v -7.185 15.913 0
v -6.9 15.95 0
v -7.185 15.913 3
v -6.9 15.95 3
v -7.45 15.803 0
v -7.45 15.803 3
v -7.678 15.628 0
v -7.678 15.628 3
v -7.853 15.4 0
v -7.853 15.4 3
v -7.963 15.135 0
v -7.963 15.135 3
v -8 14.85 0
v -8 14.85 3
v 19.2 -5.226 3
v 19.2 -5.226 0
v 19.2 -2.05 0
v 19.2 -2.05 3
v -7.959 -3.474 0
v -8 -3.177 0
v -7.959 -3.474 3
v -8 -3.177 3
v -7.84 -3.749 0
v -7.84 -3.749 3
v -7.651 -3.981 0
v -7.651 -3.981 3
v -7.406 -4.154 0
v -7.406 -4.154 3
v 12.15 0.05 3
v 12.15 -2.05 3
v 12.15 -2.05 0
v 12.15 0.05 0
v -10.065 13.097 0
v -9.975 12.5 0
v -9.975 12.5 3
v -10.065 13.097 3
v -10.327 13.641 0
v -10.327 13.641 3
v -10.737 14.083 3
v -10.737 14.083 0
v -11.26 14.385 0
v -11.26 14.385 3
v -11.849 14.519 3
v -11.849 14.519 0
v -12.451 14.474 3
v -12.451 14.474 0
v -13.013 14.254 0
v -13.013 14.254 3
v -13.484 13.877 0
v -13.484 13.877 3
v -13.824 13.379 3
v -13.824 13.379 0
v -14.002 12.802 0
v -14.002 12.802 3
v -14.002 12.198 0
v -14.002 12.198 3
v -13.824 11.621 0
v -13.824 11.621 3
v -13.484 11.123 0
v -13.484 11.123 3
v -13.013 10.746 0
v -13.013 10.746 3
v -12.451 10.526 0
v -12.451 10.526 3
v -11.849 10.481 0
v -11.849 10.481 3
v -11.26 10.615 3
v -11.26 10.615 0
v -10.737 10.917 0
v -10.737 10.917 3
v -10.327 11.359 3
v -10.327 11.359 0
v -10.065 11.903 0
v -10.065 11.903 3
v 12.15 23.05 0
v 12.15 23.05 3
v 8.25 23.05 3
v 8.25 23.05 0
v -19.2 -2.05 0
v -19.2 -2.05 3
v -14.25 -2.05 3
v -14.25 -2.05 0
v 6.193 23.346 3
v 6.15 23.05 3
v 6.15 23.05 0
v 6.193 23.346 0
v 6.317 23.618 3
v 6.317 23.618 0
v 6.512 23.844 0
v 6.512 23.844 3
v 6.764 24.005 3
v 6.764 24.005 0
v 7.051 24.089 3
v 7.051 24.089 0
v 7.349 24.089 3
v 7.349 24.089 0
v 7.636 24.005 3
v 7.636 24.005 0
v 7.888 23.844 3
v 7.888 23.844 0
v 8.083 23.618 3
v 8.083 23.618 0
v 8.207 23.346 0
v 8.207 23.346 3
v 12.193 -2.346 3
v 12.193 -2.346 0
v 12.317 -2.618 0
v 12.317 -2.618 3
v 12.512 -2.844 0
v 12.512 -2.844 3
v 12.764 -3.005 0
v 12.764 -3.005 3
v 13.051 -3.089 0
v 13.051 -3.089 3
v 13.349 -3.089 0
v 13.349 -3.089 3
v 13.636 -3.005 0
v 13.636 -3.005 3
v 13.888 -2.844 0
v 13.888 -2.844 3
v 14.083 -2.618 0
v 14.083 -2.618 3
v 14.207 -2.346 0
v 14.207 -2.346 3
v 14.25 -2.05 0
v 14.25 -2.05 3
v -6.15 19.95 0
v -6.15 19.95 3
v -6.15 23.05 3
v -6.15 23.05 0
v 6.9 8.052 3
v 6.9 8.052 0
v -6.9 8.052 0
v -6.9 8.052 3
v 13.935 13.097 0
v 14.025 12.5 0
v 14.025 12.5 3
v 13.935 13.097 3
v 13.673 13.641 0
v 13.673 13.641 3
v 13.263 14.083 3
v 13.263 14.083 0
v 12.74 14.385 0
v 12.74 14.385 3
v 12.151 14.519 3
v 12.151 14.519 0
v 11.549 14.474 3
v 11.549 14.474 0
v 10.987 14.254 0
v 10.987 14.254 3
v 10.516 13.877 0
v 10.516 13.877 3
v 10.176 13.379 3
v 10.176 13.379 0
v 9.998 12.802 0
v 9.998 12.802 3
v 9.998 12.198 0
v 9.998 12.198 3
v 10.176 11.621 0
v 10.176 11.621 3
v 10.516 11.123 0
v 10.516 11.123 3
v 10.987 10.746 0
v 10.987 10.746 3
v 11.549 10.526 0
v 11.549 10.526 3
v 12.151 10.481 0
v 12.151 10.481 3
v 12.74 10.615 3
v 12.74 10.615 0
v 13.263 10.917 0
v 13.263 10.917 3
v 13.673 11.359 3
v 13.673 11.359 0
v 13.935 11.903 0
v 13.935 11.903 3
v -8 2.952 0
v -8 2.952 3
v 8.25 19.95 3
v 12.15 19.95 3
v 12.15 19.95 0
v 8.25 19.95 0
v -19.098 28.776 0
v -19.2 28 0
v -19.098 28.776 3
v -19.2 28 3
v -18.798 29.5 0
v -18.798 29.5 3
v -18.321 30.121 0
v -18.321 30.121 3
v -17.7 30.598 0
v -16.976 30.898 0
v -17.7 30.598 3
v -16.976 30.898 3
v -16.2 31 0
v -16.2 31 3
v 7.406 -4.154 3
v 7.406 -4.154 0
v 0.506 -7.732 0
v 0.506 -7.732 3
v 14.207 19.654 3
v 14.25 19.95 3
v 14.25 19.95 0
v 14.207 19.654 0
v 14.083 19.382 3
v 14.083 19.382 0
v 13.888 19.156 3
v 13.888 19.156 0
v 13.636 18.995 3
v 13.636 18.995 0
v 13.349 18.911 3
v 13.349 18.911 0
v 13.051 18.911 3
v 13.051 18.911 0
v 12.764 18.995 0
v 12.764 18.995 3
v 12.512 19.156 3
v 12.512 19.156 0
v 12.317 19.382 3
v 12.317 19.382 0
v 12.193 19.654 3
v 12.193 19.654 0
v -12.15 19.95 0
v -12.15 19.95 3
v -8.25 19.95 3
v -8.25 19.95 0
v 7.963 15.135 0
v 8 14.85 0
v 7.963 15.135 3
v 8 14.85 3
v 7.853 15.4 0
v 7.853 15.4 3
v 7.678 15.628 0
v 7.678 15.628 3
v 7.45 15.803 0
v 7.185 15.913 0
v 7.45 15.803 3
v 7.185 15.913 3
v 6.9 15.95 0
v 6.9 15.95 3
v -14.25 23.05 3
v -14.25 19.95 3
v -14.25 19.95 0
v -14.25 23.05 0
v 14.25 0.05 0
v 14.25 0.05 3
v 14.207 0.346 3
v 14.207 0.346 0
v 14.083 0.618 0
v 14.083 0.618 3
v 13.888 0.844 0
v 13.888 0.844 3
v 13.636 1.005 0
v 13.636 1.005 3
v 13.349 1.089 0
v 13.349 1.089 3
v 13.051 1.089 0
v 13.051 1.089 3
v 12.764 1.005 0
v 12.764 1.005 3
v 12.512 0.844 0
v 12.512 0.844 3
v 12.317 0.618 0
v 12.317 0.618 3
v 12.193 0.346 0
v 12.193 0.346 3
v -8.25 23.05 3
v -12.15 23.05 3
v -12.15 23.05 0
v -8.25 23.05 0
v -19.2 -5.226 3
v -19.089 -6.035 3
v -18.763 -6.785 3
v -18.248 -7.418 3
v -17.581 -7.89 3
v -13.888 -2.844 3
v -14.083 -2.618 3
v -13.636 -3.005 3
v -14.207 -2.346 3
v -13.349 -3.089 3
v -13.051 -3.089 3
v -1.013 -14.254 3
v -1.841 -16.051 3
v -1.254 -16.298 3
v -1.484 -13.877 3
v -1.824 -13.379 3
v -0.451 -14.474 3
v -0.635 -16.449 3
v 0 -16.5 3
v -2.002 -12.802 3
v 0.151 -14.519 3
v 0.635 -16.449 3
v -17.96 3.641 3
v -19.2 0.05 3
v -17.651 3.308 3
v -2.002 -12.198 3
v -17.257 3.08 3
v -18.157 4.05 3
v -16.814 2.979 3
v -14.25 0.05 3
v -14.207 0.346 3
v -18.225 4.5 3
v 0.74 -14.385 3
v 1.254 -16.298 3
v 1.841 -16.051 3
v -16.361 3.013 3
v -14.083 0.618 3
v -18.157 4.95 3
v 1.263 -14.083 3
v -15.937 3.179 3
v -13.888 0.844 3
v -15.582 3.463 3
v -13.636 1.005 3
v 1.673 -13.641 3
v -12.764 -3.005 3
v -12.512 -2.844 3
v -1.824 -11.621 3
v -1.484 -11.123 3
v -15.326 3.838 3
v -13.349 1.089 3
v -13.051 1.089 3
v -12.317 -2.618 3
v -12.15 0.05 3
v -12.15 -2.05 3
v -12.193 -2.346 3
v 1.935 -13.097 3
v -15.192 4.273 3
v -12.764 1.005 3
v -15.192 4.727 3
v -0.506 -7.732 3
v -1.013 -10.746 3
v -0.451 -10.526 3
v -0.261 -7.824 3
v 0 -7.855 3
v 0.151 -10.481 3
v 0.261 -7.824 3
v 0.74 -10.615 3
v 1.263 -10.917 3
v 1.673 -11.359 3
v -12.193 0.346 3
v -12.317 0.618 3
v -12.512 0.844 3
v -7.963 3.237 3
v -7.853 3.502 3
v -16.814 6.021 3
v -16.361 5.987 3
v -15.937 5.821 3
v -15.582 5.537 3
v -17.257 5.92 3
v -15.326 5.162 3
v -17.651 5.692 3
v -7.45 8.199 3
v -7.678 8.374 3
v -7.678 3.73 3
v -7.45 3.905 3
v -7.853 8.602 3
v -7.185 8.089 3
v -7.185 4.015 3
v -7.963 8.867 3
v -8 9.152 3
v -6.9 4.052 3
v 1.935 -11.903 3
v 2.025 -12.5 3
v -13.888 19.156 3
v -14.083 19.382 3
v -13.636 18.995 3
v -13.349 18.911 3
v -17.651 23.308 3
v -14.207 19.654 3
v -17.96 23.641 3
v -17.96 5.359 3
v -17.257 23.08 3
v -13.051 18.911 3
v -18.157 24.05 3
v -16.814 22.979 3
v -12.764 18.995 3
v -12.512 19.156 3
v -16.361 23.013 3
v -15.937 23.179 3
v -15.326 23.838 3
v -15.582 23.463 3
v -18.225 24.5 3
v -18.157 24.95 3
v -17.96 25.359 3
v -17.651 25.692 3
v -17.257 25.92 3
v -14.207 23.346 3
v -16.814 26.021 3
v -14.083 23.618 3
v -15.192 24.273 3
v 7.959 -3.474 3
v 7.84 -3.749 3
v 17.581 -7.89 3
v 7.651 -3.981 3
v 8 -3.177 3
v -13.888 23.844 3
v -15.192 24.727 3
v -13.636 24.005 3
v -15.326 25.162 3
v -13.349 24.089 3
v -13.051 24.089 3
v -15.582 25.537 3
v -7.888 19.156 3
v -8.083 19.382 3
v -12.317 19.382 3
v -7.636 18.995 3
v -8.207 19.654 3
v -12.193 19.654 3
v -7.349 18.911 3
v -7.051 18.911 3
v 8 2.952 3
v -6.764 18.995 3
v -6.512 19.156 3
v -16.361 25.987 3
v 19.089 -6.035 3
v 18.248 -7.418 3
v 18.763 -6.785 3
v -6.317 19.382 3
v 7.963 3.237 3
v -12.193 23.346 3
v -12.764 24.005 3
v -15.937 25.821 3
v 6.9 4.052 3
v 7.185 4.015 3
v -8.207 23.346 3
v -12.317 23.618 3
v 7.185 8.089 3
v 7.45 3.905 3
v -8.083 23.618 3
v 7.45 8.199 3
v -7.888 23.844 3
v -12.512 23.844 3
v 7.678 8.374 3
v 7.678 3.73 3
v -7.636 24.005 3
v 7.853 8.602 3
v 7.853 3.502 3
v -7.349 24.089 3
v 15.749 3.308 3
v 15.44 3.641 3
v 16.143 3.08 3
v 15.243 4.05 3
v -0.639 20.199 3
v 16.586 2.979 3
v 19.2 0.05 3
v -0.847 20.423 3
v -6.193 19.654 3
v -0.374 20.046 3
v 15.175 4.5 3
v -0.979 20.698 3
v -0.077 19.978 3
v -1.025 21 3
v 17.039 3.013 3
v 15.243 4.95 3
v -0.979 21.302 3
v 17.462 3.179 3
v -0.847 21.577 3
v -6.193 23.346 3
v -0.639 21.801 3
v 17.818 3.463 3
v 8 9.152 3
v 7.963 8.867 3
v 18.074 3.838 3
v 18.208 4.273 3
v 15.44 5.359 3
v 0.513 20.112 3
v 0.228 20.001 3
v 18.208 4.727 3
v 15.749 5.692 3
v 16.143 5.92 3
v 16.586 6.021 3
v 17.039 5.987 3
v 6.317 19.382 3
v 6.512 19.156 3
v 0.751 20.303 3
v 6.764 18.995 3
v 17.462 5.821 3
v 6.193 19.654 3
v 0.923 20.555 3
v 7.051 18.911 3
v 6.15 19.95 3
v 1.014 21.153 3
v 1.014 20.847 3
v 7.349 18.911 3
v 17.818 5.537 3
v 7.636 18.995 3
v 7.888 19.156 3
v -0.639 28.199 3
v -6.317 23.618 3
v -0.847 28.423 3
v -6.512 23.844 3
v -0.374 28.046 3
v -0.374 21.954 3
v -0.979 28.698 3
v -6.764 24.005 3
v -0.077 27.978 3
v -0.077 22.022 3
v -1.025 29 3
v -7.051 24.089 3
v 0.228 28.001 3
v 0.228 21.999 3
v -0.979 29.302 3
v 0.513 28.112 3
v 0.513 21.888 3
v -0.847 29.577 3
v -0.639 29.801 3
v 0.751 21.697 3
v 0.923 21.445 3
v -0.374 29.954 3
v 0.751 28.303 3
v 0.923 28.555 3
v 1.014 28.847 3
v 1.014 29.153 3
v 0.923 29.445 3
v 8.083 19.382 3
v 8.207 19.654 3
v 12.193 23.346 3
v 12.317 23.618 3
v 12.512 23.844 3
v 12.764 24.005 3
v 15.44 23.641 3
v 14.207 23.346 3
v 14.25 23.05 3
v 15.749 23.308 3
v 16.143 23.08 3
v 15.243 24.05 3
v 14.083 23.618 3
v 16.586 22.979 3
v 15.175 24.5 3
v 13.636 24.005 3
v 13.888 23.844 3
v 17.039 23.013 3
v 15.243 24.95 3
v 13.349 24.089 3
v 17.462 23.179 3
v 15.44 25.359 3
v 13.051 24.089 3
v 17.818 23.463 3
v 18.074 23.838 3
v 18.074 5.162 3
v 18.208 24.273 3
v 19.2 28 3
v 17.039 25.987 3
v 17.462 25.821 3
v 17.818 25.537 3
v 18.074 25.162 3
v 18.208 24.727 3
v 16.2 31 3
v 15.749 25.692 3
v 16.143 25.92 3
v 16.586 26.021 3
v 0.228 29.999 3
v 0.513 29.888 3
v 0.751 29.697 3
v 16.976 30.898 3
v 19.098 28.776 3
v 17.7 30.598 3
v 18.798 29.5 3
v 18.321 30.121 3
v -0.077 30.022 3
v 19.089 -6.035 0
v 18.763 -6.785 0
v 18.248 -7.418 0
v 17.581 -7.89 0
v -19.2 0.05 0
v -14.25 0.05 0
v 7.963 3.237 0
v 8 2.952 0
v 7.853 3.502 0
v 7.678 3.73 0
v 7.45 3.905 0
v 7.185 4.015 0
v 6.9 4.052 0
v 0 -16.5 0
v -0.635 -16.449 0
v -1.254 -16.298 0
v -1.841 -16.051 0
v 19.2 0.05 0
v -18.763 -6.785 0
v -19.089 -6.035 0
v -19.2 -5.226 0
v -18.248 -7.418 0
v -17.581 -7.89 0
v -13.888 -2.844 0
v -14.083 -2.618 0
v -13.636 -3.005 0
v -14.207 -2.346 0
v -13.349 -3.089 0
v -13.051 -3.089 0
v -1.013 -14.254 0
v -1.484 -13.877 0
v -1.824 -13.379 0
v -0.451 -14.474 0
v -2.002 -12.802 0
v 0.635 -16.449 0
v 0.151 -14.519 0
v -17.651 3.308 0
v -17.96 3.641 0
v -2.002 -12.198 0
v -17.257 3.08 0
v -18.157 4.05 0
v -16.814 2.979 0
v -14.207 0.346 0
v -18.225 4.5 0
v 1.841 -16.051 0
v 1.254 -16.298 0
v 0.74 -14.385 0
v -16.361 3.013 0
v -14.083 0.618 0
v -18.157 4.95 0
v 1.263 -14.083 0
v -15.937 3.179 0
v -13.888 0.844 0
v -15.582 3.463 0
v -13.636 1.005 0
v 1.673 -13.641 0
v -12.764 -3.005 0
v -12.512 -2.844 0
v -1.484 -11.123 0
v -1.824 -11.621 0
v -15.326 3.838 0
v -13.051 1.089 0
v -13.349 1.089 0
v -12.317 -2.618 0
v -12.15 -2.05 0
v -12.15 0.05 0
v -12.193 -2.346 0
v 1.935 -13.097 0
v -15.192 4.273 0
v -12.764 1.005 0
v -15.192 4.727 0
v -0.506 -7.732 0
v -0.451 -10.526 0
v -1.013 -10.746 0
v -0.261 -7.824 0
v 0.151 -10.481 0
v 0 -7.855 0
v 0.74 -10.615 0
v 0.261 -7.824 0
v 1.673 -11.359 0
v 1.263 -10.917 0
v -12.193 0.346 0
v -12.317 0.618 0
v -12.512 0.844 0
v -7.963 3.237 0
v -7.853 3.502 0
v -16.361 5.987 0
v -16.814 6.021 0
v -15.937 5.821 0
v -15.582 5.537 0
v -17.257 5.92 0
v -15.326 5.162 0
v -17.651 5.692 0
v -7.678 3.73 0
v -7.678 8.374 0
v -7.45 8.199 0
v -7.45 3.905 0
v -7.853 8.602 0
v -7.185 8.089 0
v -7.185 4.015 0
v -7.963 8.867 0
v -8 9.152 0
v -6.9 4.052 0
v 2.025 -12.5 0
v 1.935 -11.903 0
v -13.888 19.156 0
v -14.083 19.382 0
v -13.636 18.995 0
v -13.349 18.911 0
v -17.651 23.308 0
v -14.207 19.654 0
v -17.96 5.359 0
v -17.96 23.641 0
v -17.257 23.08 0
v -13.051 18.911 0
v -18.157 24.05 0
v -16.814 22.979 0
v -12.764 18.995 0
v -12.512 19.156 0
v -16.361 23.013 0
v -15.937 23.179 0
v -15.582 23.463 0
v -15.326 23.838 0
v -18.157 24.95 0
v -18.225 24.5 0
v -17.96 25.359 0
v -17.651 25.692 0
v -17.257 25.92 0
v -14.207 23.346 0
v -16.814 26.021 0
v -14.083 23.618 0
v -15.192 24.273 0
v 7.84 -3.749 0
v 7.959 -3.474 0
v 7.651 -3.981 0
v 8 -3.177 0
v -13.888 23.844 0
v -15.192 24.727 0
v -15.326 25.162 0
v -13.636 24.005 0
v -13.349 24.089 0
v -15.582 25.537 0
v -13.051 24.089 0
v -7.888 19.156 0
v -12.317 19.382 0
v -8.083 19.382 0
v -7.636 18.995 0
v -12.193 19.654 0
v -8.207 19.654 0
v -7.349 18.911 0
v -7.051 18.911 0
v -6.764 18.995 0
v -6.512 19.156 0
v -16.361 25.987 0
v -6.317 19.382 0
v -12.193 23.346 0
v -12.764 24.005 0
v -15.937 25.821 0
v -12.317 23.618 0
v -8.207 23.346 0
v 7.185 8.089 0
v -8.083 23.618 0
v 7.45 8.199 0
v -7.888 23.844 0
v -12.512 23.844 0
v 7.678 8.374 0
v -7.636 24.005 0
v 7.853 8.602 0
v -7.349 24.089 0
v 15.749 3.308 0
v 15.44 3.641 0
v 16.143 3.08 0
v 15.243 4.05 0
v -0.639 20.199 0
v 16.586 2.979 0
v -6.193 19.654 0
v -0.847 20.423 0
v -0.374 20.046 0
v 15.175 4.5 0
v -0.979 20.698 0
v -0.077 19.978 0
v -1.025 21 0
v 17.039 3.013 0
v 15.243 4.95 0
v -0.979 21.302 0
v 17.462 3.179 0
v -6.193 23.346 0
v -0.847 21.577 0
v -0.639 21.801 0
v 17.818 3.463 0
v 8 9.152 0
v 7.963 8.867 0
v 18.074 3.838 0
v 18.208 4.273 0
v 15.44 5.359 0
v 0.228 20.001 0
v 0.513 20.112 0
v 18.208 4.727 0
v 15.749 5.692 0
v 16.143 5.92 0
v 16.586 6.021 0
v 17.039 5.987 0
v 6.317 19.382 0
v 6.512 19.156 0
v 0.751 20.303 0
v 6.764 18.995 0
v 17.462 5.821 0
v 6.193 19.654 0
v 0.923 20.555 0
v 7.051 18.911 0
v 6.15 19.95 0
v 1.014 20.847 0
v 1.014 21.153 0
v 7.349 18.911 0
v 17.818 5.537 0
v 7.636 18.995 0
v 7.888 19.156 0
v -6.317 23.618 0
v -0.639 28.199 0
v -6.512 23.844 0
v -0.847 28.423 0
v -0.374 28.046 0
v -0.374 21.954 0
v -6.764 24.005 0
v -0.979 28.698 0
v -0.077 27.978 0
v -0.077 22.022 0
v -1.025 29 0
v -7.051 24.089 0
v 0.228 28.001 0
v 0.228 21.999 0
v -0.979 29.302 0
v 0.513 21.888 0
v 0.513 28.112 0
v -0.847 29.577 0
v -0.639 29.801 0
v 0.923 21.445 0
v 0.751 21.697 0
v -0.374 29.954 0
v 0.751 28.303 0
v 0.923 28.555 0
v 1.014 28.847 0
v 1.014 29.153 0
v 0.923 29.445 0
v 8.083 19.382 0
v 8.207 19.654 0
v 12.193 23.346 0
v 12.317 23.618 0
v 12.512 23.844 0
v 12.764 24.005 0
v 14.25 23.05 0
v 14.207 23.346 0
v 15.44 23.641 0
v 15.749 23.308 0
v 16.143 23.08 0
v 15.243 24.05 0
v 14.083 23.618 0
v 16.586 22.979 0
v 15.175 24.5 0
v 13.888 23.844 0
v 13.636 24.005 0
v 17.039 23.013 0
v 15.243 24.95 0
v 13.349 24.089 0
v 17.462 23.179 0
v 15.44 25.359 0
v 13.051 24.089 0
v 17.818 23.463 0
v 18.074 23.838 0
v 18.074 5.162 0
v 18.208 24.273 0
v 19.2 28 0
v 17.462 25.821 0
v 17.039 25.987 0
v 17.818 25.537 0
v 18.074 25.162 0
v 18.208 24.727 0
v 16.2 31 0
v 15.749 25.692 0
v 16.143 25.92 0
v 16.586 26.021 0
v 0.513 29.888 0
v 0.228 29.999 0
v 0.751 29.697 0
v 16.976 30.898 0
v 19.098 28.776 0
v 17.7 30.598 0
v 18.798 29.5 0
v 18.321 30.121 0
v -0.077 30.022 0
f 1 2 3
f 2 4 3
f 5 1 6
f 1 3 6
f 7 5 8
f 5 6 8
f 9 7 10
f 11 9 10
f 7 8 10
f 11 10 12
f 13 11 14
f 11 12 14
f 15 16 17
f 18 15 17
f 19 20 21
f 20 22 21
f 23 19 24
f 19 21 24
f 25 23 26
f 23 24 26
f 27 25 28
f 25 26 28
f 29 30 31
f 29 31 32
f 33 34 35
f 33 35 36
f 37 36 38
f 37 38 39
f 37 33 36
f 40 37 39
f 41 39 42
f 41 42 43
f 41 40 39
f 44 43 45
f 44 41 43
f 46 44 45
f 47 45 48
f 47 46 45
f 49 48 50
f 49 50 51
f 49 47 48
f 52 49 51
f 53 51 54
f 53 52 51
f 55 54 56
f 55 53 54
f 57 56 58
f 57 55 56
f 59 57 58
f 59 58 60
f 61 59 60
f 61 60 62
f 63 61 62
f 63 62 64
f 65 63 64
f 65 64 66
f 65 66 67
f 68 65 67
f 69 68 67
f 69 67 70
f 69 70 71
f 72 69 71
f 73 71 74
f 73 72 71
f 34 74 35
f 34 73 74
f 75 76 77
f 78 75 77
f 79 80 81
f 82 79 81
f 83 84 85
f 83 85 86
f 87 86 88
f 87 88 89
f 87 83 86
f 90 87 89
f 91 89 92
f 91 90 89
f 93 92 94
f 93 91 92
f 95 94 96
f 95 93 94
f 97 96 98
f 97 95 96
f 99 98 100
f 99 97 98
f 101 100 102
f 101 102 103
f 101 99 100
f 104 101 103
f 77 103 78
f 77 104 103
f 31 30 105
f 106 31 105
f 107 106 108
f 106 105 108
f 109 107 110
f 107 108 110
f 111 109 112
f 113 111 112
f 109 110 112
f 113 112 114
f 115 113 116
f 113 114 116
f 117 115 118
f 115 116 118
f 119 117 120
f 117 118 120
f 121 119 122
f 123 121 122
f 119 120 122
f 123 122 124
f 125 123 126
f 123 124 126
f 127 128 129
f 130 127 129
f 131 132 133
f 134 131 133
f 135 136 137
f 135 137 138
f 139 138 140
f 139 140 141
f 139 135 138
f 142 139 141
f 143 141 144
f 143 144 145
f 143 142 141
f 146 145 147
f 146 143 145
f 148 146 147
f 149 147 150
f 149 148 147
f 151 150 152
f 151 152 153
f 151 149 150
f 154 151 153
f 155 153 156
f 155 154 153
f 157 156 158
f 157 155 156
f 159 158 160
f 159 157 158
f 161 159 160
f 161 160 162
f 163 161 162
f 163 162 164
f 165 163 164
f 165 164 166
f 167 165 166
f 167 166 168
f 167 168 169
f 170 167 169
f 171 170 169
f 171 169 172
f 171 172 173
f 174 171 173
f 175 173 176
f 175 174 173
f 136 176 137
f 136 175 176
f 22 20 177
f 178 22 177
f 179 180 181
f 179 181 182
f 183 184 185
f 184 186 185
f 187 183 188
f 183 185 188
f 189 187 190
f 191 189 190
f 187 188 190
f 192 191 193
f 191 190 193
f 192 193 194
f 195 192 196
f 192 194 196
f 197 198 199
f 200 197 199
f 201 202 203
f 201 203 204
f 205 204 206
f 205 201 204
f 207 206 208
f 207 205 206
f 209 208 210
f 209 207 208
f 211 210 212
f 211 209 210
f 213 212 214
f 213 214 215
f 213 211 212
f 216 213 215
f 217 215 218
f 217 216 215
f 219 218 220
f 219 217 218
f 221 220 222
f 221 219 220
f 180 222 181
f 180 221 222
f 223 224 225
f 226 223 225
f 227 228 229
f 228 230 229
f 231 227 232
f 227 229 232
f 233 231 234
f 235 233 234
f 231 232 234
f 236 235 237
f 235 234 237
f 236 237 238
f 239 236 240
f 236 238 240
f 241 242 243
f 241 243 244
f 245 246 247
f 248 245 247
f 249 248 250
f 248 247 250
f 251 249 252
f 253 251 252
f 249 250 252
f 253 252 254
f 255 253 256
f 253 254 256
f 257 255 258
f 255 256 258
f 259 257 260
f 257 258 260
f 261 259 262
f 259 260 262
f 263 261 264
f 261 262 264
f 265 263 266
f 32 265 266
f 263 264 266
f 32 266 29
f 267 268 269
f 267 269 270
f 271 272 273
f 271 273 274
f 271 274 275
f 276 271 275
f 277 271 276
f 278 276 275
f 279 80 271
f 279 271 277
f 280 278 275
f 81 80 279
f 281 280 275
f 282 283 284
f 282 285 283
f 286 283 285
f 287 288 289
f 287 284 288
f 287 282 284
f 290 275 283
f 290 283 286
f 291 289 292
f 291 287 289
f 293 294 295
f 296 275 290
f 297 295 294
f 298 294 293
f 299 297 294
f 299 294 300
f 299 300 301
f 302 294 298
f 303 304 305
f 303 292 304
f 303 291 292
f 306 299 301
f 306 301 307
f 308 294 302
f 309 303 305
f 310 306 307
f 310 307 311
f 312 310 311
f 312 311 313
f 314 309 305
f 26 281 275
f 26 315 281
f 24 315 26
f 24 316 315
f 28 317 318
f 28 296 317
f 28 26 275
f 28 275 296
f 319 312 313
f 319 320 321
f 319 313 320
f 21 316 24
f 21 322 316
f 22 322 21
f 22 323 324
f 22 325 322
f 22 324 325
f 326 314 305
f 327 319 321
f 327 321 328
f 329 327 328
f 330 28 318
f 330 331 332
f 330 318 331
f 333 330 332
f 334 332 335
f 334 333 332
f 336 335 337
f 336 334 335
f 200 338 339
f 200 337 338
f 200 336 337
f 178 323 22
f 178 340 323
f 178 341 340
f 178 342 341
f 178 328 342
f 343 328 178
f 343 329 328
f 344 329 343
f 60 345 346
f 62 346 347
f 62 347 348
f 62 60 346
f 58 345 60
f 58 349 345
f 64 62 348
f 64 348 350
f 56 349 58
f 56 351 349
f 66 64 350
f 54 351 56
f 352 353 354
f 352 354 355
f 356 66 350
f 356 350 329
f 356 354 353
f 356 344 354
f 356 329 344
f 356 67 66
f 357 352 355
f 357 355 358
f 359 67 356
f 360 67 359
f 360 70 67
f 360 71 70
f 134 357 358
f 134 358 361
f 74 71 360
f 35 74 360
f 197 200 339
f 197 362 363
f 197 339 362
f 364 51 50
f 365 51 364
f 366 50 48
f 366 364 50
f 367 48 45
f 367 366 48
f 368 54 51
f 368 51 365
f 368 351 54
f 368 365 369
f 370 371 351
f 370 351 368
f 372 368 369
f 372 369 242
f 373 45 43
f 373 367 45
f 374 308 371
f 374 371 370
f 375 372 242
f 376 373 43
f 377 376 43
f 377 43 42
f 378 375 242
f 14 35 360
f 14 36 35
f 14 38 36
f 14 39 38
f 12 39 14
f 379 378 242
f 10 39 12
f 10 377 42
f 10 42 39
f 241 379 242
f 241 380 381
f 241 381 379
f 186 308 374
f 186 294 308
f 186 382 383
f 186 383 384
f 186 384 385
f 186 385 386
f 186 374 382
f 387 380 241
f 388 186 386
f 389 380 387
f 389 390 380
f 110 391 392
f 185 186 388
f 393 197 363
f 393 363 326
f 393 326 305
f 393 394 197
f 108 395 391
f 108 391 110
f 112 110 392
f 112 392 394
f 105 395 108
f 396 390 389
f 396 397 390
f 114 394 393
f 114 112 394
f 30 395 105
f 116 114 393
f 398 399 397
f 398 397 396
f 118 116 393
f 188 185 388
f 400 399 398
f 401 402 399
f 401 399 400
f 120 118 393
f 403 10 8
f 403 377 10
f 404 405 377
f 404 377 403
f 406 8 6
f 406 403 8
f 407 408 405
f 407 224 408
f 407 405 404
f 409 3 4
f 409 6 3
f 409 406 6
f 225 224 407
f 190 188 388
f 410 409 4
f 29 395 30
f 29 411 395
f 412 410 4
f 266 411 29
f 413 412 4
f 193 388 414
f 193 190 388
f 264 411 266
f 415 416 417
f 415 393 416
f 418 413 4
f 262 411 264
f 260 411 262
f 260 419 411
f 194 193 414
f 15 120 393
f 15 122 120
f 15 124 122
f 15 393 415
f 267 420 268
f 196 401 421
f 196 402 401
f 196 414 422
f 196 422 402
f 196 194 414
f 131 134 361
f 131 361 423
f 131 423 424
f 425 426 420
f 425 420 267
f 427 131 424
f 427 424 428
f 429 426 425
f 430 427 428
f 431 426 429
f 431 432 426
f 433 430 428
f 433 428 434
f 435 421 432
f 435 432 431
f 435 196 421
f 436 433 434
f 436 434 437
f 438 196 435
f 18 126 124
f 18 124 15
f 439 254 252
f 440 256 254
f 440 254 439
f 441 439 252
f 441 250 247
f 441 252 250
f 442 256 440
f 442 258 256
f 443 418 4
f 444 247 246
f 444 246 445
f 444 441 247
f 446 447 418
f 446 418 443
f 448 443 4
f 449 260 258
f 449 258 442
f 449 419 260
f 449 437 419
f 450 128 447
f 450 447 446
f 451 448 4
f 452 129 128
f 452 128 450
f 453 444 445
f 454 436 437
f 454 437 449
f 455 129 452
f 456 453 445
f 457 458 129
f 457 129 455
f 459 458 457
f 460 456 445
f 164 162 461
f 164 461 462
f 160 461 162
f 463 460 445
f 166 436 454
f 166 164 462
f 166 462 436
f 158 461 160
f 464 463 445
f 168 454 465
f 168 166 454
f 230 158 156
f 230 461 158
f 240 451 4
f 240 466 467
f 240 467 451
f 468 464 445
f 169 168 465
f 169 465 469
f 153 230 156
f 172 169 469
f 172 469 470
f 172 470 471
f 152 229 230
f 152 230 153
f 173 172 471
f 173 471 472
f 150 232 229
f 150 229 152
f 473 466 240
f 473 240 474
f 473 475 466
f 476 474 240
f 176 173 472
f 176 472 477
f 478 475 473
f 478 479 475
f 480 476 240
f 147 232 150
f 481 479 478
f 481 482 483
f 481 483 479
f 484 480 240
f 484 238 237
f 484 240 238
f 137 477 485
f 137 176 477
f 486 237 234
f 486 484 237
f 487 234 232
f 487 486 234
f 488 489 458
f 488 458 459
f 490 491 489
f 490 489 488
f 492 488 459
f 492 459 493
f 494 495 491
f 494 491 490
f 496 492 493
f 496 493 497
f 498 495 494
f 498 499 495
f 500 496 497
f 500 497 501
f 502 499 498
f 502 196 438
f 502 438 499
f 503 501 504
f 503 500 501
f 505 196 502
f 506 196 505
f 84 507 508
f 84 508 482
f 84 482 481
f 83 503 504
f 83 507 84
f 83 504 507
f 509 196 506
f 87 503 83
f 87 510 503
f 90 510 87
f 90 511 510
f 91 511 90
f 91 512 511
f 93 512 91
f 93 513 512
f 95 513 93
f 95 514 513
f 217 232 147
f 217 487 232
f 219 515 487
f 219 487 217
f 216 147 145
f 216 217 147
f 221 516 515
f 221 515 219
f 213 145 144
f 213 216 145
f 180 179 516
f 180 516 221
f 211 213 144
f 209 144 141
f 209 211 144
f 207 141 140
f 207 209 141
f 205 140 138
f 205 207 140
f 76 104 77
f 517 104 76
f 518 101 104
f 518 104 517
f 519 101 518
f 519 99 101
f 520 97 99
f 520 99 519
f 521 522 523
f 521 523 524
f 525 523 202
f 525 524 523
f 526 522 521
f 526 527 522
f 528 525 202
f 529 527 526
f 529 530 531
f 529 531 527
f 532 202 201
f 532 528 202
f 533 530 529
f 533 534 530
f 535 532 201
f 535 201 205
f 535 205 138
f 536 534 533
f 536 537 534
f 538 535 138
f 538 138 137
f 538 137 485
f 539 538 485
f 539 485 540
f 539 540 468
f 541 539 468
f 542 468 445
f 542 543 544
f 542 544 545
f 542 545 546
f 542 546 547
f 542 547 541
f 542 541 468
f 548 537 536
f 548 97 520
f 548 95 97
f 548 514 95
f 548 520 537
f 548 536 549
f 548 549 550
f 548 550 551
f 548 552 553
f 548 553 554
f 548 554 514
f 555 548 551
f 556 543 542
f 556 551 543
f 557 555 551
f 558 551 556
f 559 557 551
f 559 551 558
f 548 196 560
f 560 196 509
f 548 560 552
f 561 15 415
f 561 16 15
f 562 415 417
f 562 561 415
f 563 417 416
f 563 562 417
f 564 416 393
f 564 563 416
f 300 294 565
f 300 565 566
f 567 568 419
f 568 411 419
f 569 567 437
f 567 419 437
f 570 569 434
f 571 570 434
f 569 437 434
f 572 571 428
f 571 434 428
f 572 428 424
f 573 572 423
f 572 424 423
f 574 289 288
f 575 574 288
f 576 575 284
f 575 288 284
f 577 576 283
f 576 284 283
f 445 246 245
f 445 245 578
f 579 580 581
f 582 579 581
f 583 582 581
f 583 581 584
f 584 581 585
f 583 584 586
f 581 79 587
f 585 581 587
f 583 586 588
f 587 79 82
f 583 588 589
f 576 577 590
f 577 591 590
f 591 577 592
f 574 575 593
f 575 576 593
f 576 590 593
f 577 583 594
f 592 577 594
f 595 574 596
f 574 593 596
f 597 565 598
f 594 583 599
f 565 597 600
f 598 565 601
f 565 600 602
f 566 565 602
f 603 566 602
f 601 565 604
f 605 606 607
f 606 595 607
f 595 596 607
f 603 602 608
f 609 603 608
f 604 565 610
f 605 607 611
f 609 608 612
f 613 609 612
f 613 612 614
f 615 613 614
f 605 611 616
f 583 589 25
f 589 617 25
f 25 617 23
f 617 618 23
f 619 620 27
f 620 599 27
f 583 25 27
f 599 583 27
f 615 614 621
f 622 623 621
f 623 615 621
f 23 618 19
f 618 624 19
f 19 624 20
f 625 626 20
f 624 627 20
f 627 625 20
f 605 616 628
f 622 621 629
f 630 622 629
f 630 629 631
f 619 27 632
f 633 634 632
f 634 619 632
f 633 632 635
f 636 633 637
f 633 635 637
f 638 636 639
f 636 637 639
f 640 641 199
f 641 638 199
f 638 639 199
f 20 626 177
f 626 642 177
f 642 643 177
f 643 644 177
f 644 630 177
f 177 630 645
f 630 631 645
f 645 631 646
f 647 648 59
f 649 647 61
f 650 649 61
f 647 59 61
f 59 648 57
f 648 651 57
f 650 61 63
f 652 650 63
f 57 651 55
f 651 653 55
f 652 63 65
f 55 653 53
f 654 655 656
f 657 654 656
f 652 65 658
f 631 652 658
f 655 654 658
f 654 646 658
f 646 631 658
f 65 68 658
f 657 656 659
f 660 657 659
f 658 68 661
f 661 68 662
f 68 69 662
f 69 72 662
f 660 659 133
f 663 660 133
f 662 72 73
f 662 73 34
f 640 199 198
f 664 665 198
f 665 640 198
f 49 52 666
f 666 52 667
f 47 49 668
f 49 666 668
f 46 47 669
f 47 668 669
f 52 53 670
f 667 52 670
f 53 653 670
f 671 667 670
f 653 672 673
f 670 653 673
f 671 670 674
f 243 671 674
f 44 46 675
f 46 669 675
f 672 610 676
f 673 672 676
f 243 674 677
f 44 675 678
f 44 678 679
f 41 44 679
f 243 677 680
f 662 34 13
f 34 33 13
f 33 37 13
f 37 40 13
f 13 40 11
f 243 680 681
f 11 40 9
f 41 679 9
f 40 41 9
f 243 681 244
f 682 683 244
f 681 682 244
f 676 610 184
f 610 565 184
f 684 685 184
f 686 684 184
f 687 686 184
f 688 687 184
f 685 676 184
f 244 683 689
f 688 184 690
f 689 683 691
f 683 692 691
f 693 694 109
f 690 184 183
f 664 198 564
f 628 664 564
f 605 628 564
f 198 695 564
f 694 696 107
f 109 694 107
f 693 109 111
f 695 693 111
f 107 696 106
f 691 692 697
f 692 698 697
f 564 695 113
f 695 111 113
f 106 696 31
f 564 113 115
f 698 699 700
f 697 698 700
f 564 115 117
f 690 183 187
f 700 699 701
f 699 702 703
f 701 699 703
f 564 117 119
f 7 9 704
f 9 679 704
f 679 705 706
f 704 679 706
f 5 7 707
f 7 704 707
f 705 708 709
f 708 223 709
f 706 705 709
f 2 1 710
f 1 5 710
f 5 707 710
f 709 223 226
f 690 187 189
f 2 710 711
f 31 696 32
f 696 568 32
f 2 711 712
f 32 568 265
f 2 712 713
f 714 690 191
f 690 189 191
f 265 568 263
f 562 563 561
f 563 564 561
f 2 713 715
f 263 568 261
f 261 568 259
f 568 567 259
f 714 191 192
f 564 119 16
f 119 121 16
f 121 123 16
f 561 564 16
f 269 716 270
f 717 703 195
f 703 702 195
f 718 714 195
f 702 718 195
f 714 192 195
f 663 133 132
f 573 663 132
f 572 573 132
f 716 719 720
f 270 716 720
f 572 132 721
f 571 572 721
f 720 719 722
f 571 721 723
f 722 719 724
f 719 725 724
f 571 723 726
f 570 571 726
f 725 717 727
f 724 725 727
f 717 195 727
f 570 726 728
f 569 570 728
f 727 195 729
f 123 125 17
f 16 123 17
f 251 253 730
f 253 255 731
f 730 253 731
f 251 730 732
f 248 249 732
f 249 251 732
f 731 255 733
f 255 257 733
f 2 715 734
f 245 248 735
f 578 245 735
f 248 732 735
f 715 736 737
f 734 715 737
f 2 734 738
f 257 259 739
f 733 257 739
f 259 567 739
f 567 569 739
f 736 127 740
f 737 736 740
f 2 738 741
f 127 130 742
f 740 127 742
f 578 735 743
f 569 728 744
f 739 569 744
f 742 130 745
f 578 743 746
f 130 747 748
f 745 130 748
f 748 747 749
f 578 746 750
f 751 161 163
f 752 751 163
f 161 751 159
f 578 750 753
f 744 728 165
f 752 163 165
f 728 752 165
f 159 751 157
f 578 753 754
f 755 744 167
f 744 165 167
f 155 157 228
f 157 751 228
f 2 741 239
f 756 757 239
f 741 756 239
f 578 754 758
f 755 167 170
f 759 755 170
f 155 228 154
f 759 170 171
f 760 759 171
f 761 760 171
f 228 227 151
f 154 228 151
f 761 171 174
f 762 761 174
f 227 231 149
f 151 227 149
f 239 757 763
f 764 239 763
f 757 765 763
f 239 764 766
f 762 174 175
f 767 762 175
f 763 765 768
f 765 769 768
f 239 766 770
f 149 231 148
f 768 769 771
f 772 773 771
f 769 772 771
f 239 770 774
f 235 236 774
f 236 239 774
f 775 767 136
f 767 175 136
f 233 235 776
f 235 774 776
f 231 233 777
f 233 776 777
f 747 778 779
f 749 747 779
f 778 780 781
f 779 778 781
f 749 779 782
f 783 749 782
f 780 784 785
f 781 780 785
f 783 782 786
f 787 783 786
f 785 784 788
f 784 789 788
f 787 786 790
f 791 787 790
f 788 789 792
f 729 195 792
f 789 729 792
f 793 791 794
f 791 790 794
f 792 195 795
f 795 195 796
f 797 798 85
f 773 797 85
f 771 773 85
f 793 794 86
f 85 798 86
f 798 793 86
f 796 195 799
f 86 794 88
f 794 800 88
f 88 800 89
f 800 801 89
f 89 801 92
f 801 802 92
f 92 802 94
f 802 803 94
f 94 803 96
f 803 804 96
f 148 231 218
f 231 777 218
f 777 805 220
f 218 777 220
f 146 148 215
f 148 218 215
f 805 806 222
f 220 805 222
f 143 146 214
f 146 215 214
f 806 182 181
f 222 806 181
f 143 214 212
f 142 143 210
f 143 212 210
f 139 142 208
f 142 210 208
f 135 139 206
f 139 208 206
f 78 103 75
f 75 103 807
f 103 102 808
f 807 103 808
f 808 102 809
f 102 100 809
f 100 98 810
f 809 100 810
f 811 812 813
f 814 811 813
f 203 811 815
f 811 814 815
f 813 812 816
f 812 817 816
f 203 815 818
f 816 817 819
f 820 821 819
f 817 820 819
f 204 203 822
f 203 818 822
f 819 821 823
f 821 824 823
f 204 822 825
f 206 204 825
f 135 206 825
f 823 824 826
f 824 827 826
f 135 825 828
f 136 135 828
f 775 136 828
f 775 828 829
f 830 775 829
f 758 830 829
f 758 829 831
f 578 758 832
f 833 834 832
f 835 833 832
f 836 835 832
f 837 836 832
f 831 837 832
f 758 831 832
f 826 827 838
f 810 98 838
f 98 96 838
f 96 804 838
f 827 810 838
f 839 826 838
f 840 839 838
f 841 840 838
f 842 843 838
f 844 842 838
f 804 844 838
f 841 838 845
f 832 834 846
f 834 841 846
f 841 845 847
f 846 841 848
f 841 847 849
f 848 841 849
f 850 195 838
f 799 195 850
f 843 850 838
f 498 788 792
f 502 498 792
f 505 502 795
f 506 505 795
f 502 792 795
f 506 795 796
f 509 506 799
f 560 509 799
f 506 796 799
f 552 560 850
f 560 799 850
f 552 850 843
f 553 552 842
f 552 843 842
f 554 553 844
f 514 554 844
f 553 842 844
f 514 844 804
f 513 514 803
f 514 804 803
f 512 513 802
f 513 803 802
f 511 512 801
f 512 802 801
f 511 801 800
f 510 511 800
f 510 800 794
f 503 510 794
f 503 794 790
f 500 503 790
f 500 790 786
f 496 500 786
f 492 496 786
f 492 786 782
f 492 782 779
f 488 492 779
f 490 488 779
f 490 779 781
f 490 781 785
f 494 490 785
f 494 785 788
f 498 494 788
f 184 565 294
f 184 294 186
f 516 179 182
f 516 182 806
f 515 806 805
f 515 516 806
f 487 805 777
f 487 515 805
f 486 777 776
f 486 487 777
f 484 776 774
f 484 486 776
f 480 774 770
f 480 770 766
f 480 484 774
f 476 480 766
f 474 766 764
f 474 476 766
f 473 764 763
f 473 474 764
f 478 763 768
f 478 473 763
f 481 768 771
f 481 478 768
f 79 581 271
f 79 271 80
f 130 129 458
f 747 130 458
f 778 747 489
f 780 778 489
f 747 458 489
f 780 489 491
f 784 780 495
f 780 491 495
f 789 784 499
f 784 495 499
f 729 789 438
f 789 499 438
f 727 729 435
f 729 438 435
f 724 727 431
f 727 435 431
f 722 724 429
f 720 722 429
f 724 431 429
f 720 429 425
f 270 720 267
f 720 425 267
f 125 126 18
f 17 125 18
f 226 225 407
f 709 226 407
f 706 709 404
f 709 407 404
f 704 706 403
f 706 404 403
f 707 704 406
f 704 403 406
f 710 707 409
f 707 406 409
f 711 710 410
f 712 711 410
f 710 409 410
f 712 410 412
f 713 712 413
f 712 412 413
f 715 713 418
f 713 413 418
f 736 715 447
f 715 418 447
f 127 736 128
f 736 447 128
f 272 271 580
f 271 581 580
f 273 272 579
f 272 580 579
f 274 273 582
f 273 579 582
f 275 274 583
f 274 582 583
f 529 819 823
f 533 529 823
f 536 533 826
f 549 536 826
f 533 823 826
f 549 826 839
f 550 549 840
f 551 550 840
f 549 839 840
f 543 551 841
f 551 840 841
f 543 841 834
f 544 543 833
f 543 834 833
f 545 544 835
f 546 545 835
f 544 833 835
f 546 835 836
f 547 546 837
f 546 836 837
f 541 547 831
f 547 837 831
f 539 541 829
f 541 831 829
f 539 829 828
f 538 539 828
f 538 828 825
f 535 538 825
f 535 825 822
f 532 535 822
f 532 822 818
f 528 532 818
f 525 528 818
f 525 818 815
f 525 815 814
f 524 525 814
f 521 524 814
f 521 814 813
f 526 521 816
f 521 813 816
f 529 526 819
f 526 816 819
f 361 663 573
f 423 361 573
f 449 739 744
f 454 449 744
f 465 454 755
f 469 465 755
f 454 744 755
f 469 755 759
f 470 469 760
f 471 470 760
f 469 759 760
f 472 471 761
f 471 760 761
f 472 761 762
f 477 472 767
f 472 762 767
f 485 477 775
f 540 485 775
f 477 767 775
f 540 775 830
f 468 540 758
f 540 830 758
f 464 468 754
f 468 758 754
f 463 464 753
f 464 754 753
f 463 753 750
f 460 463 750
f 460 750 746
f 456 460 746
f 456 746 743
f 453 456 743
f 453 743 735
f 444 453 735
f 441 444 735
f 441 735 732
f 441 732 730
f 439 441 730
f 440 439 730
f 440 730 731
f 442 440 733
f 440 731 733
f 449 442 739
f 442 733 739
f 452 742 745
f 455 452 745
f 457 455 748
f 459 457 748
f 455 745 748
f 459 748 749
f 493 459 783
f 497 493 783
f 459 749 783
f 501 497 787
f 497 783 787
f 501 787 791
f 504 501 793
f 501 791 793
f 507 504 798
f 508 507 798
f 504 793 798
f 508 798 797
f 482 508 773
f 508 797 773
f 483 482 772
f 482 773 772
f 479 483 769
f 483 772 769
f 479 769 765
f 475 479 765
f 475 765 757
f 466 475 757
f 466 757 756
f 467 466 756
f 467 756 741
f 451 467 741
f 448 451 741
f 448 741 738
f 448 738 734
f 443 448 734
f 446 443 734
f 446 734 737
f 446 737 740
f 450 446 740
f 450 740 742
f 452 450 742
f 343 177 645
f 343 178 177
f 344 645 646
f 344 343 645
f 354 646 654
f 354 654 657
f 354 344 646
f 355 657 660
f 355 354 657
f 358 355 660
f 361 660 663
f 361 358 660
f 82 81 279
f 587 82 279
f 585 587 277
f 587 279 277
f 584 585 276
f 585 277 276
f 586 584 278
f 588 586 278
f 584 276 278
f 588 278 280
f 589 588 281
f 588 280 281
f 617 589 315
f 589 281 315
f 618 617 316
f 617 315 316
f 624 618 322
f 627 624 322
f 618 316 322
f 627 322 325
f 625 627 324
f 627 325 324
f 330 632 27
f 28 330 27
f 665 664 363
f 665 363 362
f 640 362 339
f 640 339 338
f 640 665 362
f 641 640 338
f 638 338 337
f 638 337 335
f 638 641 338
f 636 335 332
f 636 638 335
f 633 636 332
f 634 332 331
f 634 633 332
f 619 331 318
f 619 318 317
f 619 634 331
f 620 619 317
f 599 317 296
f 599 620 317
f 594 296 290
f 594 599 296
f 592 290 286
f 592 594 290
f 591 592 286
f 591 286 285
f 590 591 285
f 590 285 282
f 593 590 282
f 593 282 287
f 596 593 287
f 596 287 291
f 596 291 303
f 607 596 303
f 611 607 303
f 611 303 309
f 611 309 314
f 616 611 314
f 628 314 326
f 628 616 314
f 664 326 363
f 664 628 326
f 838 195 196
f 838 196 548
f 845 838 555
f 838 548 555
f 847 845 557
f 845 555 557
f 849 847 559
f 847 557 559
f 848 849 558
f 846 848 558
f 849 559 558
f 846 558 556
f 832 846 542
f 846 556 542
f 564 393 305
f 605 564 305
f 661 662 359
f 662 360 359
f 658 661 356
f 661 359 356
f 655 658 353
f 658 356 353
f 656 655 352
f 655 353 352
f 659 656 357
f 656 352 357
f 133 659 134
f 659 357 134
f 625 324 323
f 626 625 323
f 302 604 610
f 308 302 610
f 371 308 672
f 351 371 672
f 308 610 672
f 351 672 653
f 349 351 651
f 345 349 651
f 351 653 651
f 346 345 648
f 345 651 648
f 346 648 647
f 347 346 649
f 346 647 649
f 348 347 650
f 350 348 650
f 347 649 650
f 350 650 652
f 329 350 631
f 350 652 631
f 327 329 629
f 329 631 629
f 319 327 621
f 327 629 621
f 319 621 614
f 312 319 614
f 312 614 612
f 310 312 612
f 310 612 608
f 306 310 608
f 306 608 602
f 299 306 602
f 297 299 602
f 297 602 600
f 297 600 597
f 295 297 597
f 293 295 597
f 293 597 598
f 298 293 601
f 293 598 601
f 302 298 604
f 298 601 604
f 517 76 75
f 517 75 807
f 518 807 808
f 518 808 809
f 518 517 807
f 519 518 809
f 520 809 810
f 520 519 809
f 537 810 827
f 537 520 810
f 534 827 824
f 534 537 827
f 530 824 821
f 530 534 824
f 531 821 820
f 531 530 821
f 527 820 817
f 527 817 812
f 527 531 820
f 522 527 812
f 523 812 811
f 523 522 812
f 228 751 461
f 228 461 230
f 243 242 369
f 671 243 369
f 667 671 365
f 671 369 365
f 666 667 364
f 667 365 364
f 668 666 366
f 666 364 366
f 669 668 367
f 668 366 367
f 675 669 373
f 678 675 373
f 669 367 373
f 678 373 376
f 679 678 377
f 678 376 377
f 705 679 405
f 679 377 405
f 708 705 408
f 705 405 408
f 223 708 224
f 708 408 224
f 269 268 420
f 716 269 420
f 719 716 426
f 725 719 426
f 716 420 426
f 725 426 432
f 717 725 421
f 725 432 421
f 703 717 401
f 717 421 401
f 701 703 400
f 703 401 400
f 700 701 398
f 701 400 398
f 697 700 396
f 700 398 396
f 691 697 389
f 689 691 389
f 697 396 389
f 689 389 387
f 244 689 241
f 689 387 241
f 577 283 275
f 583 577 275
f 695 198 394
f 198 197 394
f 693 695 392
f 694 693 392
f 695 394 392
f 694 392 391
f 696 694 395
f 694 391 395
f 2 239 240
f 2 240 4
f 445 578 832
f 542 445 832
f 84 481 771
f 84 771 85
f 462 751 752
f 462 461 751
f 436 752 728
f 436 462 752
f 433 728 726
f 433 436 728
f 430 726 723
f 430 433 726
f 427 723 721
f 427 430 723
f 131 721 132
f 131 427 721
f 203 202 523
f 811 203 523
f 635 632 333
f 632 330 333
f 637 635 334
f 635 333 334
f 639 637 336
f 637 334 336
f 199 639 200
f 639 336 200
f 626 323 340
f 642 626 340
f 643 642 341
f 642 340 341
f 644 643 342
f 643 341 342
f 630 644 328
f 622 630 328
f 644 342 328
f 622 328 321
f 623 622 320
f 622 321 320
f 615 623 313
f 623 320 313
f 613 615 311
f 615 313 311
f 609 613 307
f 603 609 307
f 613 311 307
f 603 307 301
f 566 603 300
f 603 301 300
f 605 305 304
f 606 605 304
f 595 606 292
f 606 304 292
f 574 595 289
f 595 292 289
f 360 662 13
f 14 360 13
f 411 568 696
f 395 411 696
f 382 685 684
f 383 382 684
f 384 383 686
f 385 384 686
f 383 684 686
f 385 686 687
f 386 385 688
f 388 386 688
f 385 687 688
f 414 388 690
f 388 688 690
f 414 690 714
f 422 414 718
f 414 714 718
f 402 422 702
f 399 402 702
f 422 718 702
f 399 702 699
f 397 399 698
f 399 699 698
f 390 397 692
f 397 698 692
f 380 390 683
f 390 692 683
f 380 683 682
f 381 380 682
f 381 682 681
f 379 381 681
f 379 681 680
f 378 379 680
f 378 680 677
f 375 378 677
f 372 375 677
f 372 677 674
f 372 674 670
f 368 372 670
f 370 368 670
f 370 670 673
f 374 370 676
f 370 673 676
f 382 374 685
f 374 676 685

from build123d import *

# Parameters (mm, degrees)
SKETCH_1_W          = 38.4
SKETCH_1_H          = 47.5
SKETCH_1_R          = 2.025
EXTRUDE_1_DEPTH     = 3
SKETCH_2_R          = 1.025
CUT_EXTRUDE_1_DEPTH = 43
SKETCH_3_W          = 7.1
SKETCH_3_H          = 2.1
CUT_EXTRUDE_2_DEPTH = 3
CUT_EXTRUDE_3_DEPTH = 3
SKETCH_5_R          = 1.525
CUT_EXTRUDE_4_DEPTH = 3
SKETCH_6_W          = 8.1
SKETCH_6_H          = 3.1
CUT_EXTRUDE_5_DEPTH = 3
SKETCH_7_R          = 1.05
CUT_EXTRUDE_6_DEPTH = 3
CUT_EXTRUDE_7_DEPTH = 3
FILLET_1_R          = 3
SKETCH_9_W          = 16
SKETCH_9_H          = 7.89799579
CUT_EXTRUDE_8_DEPTH = 3
FILLET_2_R          = 1.1


with BuildPart() as part:
    # 草图1 → 凸台-拉伸1 (new body)
    with BuildSketch(Plane.XY):
        with Locations((0, 7.25)):
            Rectangle(SKETCH_1_W, SKETCH_1_H)
        with Locations((-12, 12.5)):
            Circle(SKETCH_1_R, mode=Mode.SUBTRACT)
        with Locations((12, 12.5)):
            Circle(SKETCH_1_R, mode=Mode.SUBTRACT)
        with Locations((0, -12.5)):
            Circle(SKETCH_1_R, mode=Mode.SUBTRACT)
    extrude(amount=EXTRUDE_1_DEPTH)

    # 草图2 → 切除-拉伸1 (cut)
    with BuildSketch(Plane(origin=(0, 0, 0), x_dir=(-1, 0, 0), z_dir=(0, 0, -1))):
        with Locations((0, 29)):
            Circle(SKETCH_2_R)
        with Locations((0, 21)):
            Circle(SKETCH_2_R)
    extrude(amount=-CUT_EXTRUDE_1_DEPTH, mode=Mode.SUBTRACT)

    # 草图3 → 切除-拉伸2 (cut)
    with BuildSketch(Plane.XY.offset(3)):
        with Locations((15.7, -1)):
            Rectangle(SKETCH_3_W, SKETCH_3_H)
        with Locations((-15.7, -1)):
            Rectangle(SKETCH_3_W, SKETCH_3_H)
    extrude(amount=-CUT_EXTRUDE_2_DEPTH, mode=Mode.SUBTRACT)

    # 草图4 → 切除-拉伸3 (cut)
    with BuildSketch(Plane.XY.offset(3)):
        with BuildLine():
            ThreePointArc((-12.15, -2.05), (-12.45753788, -1.30753788), (-13.2, -1))
            ThreePointArc((-13.2, -1), (-13.94246212, -1.30753788), (-14.25, -2.05))
            Line((-14.25, -2.05), (-12.15, -2.05))
        make_face()
        with BuildLine():
            ThreePointArc((-14.25, -2.05), (-13.2, -3.1), (-12.15, -2.05))
            Line((-12.15, -2.05), (-14.25, -2.05))
        make_face()
        with BuildLine():
            Line((-14.25, 0.05), (-12.15, 0.05))
            ThreePointArc((-12.15, 0.05), (-13.2, 1.1), (-14.25, 0.05))
        make_face()
        with BuildLine():
            ThreePointArc((-13.2, -1), (-12.45753788, -0.69246212), (-12.15, 0.05))
            Line((-12.15, 0.05), (-14.25, 0.05))
            ThreePointArc((-14.25, 0.05), (-13.94246212, -0.69246212), (-13.2, -1))
        make_face()
        with BuildLine():
            ThreePointArc((14.25, -2.05), (13.94246212, -1.30753788), (13.2, -1))
            ThreePointArc((13.2, -1), (12.45753788, -1.30753788), (12.15, -2.05))
            Line((12.15, -2.05), (14.25, -2.05))
        make_face()
        with BuildLine():
            ThreePointArc((12.15, -2.05), (13.2, -3.1), (14.25, -2.05))
            Line((14.25, -2.05), (12.15, -2.05))
        make_face()
        with BuildLine():
            Line((12.15, 0.05), (14.25, 0.05))
            ThreePointArc((14.25, 0.05), (13.2, 1.1), (12.15, 0.05))
        make_face()
        with BuildLine():
            ThreePointArc((13.2, -1), (13.94246212, -0.69246212), (14.25, 0.05))
            Line((14.25, 0.05), (12.15, 0.05))
            ThreePointArc((12.15, 0.05), (12.45753788, -0.69246212), (13.2, -1))
        make_face()
    extrude(amount=-CUT_EXTRUDE_3_DEPTH, mode=Mode.SUBTRACT)

    # 草图5 → 切除-拉伸4 (cut)
    with BuildSketch(Plane(origin=(0, 0, 0), x_dir=(-1, 0, 0), z_dir=(0, 0, -1))):
        with Locations((16.7, 4.5)):
            Circle(SKETCH_5_R)
        with Locations((16.7, 24.5)):
            Circle(SKETCH_5_R)
        with Locations((-16.7, 24.5)):
            Circle(SKETCH_5_R)
        with Locations((-16.7, 4.5)):
            Circle(SKETCH_5_R)
    extrude(amount=-CUT_EXTRUDE_4_DEPTH, mode=Mode.SUBTRACT)

    # 草图6 → 切除-拉伸5 (cut)
    with BuildSketch(Plane.XY.offset(3)):
        with Locations((-10.2, 21.5)):
            Rectangle(SKETCH_6_W, SKETCH_6_H)
    cut_extrude_5 = extrude(amount=-CUT_EXTRUDE_5_DEPTH, mode=Mode.SUBTRACT)

    # 草图7 → 切除-拉伸6 (cut)
    with BuildSketch(Plane.XY.offset(3)):
        with Locations((-13.2, 19.95)):
            Circle(SKETCH_7_R)
        with Locations((-13.2, 23.05)):
            Circle(SKETCH_7_R)
        with Locations((-7.2, 23.05)):
            Circle(SKETCH_7_R)
        with Locations((-7.2, 19.95)):
            Circle(SKETCH_7_R)
    cut_extrude_6 = extrude(amount=-CUT_EXTRUDE_6_DEPTH, mode=Mode.SUBTRACT)

    # 镜向1: 切除-拉伸5, 切除-拉伸6 across plane
    add(cut_extrude_5.mirror(Plane(origin=(0, 0, 0), x_dir=(0, 0, 1), z_dir=(1, 0, 0))), mode=Mode.SUBTRACT)
    add(cut_extrude_6.mirror(Plane(origin=(0, 0, 0), x_dir=(0, 0, 1), z_dir=(1, 0, 0))), mode=Mode.SUBTRACT)

    # 草图8 → 切除-拉伸7 (cut)
    with BuildSketch(Plane.XY.offset(3)):
        with BuildLine():
            Line((-19.2, -16.5), (0, -16.5))
            ThreePointArc((0, -16.5), (-0.947626647, -16.38612966), (-1.84130001, -16.051001869))
            Line((-1.84130001, -16.051001869), (-19.2, -7.05))
            Line((-19.2, -7.05), (-19.2, -16.5))
        make_face()
        with BuildLine():
            Line((19.2, -7.05), (1.84130001, -16.051001869))
            ThreePointArc((1.84130001, -16.051001869), (0.947626647, -16.38612966), (0, -16.5))
            Line((0, -16.5), (19.2, -16.5))
            Line((19.2, -16.5), (19.2, -7.05))
        make_face()
    extrude(amount=-CUT_EXTRUDE_7_DEPTH, mode=Mode.SUBTRACT)

    # 圆角1
    fillet_1_edges = [part.edges().sort_by_distance(p)[0] for p in [
        (-19.2, -7.05, 1.5),
        (19.2, -7.05, 1.5),
        (-19.2, 31, 1.5),
        (19.2, 31, 1.5),
    ]]
    fillet(fillet_1_edges, radius=FILLET_1_R)

    # 草图9 → 切除-拉伸8 (cut)
    with BuildSketch(Plane(origin=(0, 0, 0), x_dir=(-1, 0, 0), z_dir=(0, 0, -1))):
        Polygon((8, 4.05200421), (-8, 4.05200421), (-8, -3.845991579), (0, -7.99422935), (8, -3.845991579), align=None)
        with Locations((0, 12.001002105)):
            Rectangle(SKETCH_9_W, SKETCH_9_H)
    extrude(amount=-CUT_EXTRUDE_8_DEPTH, mode=Mode.SUBTRACT)

    # 圆角2
    fillet_2_edges = [part.edges().sort_by_distance(p)[0] for p in [
        (8, -3.845991579, 1.5),
        (0, -7.99422935, 1.5),
        (-8, -3.845991579, 1.5),
        (-8, 4.05200421, 1.5),
        (8, 4.05200421, 1.5),
        (-8, 8.05200421, 1.5),
        (-8, 15.95, 1.5),
        (8, 15.95, 1.5),
        (8, 8.05200421, 1.5),
    ]]
    fillet(fillet_2_edges, radius=FILLET_2_R)


solid = part.part
